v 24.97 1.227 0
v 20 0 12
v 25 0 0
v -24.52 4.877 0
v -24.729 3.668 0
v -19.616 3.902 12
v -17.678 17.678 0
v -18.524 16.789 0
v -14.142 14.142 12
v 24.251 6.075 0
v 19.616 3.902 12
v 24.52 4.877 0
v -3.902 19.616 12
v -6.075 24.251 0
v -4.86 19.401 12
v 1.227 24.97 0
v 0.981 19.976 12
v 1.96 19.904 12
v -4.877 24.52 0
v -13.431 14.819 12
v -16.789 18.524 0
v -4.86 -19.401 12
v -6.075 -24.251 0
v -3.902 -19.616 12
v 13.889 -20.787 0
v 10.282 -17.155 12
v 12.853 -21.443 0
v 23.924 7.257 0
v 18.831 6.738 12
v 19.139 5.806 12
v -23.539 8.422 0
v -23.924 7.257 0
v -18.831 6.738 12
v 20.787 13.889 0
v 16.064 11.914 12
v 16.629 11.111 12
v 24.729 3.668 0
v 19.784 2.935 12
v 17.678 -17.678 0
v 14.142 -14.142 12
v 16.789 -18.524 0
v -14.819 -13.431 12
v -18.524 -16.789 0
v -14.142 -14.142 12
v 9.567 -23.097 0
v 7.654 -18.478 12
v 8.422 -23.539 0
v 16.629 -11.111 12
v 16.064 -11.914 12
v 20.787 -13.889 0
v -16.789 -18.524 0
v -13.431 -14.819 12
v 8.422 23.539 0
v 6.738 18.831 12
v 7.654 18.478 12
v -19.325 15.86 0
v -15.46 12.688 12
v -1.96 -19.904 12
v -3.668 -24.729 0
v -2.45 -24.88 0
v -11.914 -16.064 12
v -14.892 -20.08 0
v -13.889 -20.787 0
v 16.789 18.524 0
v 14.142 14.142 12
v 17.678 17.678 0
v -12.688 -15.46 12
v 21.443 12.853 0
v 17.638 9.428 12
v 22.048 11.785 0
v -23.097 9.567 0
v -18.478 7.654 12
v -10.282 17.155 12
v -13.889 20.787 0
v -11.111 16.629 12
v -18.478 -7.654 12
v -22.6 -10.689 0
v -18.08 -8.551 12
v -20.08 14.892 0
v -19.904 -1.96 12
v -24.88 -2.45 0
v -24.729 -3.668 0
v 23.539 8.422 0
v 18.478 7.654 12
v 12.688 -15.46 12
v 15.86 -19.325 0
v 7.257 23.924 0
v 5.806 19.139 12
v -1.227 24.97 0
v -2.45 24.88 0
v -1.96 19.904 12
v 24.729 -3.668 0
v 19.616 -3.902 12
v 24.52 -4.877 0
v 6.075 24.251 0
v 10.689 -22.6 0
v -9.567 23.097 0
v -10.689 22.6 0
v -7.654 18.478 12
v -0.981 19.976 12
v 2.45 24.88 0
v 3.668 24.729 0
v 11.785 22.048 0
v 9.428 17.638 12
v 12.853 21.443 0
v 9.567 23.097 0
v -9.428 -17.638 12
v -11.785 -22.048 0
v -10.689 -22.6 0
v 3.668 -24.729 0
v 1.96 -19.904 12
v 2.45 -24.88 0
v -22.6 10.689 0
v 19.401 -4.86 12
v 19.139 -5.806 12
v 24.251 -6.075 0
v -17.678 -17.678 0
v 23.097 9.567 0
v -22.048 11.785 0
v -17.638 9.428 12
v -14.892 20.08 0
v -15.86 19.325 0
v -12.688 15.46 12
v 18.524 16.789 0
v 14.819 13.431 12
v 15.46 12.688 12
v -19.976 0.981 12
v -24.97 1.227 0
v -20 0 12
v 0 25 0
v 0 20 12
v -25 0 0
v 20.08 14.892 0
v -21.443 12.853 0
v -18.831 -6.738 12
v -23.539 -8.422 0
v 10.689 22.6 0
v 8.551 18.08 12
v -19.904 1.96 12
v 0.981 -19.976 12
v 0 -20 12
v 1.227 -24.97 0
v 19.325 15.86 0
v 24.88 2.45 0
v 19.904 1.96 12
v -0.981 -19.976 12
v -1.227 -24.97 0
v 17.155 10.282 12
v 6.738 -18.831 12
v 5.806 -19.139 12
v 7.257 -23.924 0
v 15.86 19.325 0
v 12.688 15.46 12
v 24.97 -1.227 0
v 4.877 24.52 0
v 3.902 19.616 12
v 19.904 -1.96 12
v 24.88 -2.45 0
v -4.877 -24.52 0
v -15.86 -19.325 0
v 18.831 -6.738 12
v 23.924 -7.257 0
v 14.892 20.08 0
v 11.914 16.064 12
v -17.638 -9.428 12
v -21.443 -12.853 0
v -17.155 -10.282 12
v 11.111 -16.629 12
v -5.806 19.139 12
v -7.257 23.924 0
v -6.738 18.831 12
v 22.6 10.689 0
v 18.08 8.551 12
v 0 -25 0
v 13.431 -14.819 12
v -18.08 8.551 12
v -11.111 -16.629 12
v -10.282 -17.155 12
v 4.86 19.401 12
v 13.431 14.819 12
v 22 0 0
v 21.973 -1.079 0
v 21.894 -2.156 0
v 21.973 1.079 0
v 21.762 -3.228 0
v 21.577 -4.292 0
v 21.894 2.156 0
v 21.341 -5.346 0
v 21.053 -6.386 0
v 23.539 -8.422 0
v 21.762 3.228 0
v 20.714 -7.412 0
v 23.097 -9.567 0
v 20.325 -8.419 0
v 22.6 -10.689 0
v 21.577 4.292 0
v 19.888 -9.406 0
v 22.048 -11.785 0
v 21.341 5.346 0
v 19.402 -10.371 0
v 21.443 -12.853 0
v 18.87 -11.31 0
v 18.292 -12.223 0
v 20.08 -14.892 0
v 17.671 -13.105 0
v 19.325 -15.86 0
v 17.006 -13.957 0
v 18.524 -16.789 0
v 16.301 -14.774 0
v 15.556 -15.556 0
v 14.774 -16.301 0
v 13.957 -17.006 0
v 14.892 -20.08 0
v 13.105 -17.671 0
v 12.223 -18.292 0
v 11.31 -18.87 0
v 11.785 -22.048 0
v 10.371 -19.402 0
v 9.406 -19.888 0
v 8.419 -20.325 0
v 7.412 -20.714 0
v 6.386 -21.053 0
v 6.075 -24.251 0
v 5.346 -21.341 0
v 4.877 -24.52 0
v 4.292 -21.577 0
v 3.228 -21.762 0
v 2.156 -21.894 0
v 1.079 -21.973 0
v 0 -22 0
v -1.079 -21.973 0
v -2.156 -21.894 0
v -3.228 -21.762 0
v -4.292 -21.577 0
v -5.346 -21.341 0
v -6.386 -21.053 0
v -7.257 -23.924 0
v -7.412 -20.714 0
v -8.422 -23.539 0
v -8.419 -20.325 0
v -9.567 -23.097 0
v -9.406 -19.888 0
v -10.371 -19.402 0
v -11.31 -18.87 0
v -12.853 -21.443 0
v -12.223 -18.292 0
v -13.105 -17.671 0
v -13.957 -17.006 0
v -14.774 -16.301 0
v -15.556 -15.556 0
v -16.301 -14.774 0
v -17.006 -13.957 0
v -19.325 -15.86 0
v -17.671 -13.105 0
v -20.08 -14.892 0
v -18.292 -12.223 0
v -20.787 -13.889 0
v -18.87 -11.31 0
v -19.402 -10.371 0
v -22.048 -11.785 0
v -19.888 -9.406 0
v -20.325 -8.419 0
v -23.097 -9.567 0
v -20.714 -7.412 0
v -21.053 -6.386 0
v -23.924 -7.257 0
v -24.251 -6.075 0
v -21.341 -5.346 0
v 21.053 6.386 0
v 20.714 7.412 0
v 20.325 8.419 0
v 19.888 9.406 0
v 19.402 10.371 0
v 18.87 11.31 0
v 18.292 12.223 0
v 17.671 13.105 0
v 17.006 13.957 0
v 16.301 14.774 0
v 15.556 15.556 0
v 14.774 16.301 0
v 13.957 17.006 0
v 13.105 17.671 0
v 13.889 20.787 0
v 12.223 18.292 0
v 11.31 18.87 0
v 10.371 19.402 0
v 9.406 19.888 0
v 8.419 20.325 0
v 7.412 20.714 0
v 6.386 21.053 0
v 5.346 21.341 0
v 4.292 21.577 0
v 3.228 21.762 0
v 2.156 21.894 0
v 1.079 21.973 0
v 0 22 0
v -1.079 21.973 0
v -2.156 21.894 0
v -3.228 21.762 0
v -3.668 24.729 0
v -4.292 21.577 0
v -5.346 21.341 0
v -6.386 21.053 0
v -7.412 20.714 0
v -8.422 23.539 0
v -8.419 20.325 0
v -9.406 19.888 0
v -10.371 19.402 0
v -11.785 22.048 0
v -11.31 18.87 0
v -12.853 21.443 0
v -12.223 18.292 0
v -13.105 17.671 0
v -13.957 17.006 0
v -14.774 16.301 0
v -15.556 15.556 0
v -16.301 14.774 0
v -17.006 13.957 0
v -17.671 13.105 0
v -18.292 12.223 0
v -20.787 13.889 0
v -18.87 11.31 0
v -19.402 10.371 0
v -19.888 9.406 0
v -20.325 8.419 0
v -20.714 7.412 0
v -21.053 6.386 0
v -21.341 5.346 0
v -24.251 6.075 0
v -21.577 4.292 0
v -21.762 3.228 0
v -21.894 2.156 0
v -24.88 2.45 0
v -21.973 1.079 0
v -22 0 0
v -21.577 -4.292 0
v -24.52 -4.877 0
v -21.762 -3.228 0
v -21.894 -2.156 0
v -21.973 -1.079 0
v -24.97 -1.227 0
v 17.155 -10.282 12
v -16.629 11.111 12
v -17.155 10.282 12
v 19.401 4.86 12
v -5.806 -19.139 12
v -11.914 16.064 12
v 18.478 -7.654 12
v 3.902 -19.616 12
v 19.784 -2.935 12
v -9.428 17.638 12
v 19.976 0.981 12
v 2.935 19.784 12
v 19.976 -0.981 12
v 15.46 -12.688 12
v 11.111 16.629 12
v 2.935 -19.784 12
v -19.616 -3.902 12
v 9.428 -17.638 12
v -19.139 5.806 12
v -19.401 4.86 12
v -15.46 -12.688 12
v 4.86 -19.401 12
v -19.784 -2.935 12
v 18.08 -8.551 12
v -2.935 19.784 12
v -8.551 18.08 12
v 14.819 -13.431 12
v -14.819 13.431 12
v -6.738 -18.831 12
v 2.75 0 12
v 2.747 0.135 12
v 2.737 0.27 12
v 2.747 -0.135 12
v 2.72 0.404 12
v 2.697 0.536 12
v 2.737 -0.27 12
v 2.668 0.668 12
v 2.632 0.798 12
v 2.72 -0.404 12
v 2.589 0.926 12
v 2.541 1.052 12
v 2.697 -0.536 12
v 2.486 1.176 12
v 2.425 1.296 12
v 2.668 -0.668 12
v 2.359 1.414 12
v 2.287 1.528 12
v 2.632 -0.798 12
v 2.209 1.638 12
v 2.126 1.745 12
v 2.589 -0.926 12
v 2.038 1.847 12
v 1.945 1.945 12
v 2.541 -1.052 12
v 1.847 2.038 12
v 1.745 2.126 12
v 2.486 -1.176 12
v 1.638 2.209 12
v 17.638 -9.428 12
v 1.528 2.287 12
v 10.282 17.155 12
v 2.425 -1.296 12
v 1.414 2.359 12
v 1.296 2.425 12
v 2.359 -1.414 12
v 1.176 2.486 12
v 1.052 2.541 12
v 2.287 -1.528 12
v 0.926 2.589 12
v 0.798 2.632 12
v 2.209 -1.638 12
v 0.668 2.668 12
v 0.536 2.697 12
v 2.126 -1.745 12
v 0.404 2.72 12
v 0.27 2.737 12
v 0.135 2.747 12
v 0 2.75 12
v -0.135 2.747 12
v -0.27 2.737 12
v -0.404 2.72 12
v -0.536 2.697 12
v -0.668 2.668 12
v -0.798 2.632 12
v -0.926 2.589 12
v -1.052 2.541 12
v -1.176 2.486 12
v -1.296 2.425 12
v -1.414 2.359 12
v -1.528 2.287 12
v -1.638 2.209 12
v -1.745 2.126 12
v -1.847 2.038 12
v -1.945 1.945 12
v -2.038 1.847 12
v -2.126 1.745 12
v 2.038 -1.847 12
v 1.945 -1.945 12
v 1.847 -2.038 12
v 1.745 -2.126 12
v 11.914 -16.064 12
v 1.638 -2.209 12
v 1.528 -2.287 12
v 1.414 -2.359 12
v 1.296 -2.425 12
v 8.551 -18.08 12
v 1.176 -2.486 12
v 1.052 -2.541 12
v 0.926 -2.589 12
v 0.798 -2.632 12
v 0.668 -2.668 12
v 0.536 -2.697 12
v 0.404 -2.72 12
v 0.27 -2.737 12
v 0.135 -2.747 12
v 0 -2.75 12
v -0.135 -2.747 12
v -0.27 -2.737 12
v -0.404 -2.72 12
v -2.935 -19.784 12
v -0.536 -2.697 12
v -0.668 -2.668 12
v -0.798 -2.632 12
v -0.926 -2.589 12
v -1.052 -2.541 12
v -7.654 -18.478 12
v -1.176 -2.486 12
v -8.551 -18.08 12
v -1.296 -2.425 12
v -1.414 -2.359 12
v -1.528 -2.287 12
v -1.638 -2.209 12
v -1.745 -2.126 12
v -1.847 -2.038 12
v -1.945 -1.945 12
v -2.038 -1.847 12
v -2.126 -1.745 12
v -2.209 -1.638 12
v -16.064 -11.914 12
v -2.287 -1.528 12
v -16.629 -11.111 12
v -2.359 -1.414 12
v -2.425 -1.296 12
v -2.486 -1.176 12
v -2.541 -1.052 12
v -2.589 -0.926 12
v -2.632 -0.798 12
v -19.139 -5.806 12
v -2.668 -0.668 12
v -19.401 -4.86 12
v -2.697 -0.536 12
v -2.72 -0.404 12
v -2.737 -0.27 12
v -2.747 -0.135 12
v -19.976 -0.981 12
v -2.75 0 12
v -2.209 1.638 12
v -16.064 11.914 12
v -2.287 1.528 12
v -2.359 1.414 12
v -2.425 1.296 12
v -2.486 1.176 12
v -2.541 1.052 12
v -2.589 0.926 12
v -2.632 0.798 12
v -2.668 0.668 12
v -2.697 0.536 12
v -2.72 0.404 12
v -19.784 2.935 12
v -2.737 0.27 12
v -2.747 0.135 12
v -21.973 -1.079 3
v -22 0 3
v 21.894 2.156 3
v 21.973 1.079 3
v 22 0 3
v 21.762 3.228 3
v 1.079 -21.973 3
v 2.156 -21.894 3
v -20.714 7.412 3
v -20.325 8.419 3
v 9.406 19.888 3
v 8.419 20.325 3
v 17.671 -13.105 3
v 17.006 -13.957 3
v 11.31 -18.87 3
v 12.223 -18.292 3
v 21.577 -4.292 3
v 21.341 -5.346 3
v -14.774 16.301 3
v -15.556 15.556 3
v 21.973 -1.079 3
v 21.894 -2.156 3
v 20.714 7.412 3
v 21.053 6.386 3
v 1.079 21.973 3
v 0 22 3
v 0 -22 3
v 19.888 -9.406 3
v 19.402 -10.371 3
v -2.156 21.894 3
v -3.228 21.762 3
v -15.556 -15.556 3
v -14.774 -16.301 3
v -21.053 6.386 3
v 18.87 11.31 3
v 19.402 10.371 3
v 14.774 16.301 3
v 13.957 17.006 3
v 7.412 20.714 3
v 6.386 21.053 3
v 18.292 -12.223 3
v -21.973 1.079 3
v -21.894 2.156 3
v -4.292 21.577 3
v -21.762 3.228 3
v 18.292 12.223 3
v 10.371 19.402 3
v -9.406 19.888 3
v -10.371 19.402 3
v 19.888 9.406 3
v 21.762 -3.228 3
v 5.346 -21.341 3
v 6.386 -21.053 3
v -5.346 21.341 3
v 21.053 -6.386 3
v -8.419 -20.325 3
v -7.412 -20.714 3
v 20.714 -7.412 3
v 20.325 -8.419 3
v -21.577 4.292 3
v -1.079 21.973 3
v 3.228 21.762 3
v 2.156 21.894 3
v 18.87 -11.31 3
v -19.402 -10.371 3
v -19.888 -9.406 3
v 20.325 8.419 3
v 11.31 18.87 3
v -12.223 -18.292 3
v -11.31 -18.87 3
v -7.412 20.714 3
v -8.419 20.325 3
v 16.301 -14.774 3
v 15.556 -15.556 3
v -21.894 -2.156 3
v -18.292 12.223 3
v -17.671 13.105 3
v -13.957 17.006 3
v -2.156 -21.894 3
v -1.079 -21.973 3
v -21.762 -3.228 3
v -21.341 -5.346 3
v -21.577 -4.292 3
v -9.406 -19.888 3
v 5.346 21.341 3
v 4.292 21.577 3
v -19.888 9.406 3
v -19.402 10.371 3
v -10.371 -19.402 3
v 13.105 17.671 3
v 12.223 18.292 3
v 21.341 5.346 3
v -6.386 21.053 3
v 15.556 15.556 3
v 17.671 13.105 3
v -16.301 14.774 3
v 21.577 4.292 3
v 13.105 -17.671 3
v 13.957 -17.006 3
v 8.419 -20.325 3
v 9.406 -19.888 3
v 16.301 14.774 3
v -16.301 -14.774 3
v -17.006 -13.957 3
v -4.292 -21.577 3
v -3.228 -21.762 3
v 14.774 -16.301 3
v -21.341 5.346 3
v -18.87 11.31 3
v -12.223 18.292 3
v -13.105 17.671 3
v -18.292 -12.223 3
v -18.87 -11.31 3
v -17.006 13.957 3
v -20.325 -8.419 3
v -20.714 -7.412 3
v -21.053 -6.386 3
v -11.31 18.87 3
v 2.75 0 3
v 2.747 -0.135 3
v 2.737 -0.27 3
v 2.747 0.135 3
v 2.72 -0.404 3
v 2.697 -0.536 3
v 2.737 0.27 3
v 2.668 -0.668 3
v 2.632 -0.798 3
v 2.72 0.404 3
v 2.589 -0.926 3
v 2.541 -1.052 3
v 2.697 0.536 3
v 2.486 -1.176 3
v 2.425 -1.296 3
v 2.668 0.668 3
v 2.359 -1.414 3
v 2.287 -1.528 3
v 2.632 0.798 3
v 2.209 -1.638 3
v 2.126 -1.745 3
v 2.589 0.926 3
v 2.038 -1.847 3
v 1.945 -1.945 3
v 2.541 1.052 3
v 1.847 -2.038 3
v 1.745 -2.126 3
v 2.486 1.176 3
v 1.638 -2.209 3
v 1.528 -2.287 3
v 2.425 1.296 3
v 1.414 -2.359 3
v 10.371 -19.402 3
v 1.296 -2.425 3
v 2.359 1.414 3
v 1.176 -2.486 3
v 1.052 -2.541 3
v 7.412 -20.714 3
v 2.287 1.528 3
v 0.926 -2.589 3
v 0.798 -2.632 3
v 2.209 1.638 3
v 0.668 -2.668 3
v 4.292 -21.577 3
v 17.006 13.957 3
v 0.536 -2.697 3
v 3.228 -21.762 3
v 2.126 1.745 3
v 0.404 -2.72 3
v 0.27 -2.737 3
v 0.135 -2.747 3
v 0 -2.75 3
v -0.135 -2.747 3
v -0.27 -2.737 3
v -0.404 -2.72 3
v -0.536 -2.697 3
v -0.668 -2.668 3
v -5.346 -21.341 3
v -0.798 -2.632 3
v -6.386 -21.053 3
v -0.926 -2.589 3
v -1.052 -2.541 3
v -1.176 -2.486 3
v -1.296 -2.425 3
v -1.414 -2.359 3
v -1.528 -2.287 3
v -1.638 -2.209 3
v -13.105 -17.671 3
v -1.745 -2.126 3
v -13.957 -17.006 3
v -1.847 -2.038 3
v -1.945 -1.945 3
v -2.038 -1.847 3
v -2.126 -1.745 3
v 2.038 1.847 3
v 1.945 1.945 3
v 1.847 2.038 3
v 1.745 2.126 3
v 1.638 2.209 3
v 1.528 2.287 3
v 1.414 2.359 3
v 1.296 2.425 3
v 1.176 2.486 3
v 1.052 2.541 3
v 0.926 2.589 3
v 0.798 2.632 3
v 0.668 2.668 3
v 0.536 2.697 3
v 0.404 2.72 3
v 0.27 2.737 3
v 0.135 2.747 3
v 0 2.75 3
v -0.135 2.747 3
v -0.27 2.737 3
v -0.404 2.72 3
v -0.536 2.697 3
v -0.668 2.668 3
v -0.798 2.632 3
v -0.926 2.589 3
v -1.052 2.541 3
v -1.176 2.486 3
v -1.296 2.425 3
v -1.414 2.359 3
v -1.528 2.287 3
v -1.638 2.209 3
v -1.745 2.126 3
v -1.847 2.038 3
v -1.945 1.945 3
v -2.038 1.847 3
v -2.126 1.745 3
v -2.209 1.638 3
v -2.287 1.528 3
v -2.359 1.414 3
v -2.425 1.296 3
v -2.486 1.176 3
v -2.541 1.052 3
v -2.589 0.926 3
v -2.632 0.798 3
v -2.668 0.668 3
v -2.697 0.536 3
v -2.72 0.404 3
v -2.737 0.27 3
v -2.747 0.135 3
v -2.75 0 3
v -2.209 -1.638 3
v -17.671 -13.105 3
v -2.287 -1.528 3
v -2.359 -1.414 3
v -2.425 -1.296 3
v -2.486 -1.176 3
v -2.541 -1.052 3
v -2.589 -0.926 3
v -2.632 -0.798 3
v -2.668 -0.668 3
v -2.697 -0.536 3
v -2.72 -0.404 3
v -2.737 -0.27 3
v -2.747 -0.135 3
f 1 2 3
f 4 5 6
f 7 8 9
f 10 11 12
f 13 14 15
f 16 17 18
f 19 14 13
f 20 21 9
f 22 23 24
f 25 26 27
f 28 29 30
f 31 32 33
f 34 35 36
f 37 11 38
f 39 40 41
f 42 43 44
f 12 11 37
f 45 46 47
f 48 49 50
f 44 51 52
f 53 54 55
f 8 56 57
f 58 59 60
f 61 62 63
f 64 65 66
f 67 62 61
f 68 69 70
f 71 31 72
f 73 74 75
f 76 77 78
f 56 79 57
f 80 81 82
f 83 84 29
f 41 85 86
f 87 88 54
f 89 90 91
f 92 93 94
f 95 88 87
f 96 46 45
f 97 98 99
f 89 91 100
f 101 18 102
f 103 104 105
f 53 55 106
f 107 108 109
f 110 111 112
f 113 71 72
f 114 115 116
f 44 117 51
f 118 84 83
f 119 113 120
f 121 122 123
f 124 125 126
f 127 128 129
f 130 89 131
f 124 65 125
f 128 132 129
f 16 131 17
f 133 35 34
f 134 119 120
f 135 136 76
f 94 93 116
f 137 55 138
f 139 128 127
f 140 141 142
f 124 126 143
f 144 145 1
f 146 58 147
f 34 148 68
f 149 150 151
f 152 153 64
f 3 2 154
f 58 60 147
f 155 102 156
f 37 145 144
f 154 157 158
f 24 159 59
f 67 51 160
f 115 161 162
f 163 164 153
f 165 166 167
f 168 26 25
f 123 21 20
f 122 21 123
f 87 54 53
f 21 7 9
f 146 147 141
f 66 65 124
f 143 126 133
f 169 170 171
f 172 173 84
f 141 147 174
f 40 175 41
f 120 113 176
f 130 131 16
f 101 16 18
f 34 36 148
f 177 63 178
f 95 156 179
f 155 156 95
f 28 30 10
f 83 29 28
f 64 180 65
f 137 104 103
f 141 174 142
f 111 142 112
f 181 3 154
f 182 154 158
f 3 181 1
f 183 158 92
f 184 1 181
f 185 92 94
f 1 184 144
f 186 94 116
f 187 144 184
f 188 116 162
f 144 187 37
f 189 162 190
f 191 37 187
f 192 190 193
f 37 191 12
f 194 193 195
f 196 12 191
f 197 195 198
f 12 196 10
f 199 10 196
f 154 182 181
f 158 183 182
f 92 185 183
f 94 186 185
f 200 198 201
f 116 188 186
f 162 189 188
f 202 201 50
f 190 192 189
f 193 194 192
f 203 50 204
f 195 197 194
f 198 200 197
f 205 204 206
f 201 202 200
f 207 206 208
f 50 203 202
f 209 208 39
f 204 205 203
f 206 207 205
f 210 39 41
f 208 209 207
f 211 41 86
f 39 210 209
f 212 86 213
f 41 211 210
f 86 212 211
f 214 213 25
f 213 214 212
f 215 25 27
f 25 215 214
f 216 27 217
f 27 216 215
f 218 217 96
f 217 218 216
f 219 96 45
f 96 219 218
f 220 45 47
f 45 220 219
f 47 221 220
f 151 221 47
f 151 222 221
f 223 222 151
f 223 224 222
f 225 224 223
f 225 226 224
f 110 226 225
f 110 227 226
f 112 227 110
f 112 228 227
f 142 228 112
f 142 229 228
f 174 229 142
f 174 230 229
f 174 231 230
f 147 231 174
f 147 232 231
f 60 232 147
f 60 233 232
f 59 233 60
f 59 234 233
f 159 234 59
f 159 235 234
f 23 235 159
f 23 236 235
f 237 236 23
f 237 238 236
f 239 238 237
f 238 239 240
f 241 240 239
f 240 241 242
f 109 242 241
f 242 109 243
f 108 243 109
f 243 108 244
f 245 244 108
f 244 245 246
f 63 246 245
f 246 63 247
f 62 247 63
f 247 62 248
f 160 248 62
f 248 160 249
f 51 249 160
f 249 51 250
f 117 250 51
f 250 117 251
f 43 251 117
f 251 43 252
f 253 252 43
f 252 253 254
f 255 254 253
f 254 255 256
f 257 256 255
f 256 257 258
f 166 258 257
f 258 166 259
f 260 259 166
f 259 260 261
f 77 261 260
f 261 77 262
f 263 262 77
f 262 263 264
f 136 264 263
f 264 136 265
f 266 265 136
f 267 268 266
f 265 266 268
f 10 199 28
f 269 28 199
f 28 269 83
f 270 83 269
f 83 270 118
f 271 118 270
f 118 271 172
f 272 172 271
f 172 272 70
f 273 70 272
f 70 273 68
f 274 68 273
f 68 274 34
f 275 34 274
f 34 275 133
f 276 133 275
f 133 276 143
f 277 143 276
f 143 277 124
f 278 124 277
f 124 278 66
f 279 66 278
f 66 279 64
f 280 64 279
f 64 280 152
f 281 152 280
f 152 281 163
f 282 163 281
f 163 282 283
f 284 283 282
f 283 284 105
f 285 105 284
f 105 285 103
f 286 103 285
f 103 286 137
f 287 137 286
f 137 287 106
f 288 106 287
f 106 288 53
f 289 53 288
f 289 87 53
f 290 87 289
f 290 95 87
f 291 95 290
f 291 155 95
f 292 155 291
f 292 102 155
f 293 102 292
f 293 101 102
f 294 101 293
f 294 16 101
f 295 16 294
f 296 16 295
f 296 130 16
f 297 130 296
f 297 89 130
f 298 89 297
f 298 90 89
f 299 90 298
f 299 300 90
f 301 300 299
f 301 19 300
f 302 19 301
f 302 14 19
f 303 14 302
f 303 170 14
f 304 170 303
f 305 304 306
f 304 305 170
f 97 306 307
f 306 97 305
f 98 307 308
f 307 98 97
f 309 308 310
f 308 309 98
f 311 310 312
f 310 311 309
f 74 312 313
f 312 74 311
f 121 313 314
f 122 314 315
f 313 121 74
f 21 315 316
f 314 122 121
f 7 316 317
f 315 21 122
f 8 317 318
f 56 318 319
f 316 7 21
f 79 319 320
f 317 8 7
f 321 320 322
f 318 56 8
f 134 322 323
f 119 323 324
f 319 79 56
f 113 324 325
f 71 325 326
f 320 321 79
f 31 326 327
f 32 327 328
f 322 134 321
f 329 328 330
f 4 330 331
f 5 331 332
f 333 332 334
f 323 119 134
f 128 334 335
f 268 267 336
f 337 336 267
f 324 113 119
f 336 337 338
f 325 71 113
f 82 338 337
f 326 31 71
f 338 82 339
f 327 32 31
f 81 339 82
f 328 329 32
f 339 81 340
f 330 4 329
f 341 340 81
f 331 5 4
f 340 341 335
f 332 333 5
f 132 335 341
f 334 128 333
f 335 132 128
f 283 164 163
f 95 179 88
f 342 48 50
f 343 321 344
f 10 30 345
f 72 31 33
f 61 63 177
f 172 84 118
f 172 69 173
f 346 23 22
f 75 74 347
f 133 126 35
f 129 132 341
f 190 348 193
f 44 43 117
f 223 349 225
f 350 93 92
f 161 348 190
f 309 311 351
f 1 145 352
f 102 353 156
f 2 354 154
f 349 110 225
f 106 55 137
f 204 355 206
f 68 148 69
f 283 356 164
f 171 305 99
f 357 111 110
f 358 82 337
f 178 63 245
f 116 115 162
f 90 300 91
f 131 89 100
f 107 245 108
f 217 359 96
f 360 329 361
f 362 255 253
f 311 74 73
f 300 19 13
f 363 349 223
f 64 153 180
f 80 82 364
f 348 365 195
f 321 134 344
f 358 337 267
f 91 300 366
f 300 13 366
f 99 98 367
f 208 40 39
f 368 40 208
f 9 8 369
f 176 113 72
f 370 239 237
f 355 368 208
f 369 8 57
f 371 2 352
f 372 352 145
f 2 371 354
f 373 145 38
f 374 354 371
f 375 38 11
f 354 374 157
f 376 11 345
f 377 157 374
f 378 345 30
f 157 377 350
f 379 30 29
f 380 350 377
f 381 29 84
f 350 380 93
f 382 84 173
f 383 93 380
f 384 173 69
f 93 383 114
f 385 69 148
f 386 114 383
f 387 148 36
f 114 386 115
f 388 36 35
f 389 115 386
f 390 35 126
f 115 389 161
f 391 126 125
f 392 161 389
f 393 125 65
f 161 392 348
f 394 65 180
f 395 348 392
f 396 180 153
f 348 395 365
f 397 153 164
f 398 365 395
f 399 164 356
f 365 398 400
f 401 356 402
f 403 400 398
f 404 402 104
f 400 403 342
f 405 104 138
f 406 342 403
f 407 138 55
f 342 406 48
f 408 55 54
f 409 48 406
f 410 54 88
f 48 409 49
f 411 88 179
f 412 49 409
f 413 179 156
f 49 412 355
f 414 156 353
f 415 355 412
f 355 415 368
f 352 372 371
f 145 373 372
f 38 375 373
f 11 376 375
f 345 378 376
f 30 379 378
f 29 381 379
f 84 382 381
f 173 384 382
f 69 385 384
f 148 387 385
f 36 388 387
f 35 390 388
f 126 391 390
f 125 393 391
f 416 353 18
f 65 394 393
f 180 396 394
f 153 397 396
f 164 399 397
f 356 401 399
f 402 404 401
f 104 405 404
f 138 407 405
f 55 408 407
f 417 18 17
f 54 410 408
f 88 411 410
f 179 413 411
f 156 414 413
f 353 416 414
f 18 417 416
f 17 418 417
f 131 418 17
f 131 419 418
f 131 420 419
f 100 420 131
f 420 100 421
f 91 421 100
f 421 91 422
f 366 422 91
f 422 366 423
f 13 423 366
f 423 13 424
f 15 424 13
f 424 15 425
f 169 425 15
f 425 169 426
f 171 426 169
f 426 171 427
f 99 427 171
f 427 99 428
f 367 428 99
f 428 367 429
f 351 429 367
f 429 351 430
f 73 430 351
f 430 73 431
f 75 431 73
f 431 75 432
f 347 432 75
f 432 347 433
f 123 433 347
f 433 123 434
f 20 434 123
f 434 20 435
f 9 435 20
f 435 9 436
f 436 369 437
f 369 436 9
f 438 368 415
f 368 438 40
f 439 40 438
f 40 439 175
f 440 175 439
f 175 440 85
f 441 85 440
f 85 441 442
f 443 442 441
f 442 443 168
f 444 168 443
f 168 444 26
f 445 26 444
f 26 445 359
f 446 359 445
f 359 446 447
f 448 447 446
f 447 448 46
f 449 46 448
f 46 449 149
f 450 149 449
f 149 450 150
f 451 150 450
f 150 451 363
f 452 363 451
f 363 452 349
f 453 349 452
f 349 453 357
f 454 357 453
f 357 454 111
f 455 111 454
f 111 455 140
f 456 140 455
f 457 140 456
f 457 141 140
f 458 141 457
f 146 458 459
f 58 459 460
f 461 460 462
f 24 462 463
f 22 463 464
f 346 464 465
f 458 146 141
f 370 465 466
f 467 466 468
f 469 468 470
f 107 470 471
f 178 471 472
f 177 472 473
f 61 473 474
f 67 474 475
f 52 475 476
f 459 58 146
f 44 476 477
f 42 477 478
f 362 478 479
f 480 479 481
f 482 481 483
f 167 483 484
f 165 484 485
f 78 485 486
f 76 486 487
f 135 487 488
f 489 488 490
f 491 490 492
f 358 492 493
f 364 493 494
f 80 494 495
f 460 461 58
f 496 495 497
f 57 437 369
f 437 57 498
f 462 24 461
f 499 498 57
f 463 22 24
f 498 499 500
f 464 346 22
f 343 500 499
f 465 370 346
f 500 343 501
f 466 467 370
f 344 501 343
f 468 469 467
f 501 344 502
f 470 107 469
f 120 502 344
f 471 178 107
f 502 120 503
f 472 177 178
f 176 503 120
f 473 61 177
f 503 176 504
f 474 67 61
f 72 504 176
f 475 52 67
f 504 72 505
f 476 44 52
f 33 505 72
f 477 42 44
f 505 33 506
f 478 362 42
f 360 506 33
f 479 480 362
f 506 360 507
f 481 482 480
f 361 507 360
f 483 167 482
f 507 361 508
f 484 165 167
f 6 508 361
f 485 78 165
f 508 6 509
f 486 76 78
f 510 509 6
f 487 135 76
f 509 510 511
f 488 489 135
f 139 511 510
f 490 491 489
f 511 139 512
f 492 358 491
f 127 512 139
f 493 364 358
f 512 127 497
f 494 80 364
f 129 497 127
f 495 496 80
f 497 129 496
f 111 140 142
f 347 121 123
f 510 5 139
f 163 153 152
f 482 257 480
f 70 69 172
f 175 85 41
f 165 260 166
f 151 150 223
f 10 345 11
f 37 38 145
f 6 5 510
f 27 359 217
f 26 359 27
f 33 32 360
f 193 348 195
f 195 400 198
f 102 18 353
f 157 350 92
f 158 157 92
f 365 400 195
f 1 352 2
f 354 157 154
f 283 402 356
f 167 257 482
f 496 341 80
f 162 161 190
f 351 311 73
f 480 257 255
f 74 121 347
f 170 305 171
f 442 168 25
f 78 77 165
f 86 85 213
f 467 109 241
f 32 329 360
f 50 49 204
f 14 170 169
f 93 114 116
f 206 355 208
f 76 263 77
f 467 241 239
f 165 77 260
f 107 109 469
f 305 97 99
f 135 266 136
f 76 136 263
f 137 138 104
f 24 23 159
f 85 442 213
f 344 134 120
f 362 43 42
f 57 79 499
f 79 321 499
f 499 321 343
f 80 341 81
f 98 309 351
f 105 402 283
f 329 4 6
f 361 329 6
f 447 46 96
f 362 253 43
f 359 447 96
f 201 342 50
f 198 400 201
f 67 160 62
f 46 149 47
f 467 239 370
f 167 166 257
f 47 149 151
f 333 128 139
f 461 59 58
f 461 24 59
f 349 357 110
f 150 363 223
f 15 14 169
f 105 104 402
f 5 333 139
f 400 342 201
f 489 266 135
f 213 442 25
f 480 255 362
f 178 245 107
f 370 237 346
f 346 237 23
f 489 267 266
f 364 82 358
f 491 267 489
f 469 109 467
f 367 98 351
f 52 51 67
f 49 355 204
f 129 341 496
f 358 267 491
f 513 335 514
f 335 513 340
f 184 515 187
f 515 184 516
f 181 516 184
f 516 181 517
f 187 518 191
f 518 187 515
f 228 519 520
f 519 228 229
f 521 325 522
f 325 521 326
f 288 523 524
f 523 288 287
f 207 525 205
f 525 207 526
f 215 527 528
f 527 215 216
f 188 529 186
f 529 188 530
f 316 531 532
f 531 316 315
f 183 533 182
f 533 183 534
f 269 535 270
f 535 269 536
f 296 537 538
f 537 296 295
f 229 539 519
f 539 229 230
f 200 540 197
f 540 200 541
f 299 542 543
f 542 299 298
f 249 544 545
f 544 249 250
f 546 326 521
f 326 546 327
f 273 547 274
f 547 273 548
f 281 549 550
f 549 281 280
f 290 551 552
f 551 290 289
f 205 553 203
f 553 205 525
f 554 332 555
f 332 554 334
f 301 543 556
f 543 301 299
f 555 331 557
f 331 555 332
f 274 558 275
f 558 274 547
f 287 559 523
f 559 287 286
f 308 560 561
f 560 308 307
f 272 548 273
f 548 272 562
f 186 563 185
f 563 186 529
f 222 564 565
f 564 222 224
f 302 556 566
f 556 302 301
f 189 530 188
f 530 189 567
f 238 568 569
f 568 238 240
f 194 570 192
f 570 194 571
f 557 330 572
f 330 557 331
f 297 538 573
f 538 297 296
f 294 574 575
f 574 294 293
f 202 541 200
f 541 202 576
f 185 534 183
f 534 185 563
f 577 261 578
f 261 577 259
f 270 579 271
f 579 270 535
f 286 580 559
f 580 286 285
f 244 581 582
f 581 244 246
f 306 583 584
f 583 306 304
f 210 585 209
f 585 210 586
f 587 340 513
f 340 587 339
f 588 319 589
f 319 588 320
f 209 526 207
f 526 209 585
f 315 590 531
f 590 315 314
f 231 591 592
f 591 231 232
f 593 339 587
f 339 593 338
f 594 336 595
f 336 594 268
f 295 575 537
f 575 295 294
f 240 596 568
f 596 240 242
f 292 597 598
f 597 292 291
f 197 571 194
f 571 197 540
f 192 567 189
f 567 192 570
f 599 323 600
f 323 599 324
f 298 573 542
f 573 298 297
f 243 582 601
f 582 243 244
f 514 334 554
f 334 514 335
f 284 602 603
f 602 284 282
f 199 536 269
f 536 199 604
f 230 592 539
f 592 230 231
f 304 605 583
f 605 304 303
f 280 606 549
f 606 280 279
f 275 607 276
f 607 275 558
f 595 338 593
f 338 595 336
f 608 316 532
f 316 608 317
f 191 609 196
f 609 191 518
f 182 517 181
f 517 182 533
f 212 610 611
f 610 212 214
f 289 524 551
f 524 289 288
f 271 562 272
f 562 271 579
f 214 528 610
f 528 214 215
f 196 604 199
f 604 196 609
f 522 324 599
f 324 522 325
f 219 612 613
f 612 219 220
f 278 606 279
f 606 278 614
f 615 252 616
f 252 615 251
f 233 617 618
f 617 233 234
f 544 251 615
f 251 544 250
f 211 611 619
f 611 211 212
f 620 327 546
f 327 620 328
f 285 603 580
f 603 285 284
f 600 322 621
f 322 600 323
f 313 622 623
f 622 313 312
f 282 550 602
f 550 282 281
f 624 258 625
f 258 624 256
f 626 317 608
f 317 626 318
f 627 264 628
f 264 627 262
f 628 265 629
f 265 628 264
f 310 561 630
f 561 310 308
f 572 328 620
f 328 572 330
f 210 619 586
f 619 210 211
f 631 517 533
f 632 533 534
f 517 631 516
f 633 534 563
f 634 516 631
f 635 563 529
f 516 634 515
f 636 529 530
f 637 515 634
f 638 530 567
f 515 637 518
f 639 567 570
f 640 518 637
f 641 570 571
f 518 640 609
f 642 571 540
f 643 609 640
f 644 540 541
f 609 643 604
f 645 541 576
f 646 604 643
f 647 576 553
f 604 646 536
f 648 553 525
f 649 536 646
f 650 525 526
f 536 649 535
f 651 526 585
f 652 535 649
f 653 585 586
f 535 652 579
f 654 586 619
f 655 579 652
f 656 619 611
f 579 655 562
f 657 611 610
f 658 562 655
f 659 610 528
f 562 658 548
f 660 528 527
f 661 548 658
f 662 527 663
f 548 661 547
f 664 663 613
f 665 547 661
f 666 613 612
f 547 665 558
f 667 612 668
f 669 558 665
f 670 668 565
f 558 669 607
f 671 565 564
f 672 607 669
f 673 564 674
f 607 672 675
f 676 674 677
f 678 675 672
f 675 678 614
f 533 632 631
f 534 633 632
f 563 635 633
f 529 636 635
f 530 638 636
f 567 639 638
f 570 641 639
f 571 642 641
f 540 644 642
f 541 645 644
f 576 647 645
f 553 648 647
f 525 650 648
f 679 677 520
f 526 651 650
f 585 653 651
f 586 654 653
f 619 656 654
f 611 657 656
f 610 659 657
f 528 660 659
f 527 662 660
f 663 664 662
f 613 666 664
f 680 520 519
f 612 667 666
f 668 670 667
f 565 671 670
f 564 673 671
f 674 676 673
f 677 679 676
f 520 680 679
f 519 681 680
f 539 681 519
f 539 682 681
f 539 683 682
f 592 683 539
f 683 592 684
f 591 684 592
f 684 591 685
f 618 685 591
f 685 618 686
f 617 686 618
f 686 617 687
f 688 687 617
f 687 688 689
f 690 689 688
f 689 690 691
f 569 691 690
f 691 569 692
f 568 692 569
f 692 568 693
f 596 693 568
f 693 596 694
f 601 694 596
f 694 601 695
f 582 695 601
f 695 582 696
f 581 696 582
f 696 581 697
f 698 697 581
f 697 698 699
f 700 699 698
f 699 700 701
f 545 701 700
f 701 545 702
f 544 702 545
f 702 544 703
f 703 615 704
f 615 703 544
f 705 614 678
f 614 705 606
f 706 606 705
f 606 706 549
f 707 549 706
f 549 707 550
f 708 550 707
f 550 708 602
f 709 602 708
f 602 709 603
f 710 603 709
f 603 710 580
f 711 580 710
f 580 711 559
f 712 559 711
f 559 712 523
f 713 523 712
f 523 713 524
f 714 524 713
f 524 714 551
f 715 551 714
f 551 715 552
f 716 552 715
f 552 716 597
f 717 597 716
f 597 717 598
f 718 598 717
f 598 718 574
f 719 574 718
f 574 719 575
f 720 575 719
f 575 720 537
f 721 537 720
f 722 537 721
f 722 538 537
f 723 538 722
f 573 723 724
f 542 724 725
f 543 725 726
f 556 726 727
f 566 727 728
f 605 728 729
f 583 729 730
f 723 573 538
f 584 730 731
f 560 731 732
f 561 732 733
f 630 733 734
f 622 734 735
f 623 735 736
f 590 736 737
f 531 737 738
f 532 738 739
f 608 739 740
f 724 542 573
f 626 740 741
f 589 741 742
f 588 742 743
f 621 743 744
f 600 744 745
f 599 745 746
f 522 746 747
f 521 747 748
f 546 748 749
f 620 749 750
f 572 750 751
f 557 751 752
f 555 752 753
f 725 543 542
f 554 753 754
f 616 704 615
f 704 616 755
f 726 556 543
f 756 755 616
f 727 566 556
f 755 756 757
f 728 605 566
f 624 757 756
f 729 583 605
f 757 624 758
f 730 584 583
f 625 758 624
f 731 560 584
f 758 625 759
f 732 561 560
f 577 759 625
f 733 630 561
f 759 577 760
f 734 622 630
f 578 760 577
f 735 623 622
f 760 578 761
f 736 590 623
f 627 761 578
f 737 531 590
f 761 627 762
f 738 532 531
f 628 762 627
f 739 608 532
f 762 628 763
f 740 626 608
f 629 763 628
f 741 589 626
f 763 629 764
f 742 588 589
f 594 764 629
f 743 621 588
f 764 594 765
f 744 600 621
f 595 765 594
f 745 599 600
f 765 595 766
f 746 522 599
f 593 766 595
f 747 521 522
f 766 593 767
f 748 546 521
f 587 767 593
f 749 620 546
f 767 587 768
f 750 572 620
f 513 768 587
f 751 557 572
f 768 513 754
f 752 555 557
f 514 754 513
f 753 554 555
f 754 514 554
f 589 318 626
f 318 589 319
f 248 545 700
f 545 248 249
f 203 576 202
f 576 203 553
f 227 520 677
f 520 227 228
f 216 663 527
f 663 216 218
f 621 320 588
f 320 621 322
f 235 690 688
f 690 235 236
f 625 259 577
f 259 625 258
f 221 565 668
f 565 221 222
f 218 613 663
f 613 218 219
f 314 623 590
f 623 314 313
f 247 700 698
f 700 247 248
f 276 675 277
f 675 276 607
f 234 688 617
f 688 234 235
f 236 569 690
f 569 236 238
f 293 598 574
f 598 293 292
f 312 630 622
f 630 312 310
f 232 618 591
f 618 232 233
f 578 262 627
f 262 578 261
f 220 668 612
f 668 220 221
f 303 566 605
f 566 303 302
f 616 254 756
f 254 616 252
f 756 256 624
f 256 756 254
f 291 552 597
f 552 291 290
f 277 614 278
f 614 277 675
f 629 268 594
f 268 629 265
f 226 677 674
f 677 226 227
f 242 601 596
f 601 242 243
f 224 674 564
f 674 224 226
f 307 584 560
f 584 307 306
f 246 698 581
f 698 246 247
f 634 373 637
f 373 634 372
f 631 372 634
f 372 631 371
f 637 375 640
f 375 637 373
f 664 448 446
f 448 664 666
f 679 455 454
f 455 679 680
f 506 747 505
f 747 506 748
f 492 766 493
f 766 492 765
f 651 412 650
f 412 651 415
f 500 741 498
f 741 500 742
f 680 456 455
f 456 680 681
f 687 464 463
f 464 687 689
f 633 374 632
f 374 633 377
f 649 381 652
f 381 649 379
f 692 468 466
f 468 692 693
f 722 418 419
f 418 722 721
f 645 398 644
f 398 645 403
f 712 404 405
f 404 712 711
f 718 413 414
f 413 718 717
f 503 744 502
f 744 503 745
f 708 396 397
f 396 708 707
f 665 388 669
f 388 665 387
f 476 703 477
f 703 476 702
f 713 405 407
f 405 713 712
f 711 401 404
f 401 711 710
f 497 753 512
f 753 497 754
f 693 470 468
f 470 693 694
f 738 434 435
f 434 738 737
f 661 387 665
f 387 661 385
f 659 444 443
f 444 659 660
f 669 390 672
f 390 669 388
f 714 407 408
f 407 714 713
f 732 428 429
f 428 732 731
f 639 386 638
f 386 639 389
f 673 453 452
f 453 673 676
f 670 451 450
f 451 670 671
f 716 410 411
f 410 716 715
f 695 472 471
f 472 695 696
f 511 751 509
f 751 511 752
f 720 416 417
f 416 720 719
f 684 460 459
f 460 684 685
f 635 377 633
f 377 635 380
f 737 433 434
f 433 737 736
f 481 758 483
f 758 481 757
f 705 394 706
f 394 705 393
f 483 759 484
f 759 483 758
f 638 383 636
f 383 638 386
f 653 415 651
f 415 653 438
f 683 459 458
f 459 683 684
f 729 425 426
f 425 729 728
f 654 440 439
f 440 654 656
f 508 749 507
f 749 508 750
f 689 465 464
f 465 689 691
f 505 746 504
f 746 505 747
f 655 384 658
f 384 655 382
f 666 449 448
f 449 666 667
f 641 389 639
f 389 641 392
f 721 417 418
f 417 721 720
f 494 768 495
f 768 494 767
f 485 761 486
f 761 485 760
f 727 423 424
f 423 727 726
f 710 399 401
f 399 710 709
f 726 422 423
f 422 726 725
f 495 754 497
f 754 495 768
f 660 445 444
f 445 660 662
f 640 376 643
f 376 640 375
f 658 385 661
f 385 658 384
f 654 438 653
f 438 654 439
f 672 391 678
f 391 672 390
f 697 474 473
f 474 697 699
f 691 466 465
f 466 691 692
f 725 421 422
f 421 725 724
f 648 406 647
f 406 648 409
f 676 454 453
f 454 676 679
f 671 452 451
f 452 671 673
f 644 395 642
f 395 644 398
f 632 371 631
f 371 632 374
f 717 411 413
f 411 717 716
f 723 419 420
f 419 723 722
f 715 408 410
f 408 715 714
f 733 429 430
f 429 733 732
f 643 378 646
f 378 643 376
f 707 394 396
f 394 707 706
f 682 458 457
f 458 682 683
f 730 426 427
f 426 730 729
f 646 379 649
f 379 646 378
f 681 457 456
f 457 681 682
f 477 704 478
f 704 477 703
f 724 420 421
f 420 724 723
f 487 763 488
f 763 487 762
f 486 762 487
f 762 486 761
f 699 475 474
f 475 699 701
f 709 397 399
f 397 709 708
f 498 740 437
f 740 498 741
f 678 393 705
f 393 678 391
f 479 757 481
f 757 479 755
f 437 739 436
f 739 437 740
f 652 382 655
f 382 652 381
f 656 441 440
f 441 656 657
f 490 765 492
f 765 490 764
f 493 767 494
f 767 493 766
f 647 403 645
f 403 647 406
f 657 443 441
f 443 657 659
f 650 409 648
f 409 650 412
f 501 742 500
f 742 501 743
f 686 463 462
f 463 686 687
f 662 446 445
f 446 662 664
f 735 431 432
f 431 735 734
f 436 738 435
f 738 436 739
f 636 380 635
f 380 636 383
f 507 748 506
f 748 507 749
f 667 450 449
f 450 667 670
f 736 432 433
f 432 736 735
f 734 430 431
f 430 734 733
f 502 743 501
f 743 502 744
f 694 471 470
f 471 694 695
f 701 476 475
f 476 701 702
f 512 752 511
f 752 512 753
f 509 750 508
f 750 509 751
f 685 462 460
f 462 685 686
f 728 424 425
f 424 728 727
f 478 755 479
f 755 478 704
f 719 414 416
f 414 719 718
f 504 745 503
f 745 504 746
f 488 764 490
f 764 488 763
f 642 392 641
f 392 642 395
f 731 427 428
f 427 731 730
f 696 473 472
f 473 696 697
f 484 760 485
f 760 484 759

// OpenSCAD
// Anti-vibration foot for benchtop instrument
// Print orientation: wide base on bed (z = 0), narrow top at z = 12

// ---------------- Parameters ----------------
base_d      = 50;    // frustum diameter at bottom (z = 0)
top_d       = 40;    // frustum diameter at flat top
foot_h      = 12;    // overall height of foot

recess_d    = 44;    // rubber pad recess diameter (bottom face)
recess_h    = 3;     // rubber pad recess depth

screw_d     = 5.5;   // through-hole diameter for screw

eps         = 0.5;   // overshoot for clean boolean cuts
$fn         = 128;   // curve resolution

// ---------------- Model ----------------
difference() {
    // Main frustum body
    cylinder(h = foot_h, d1 = base_d, d2 = top_d);

    // Rubber pad recess in bottom face
    translate([0, 0, -eps])
        cylinder(h = recess_h + eps, d = recess_d);

    // Central screw hole, full height
    translate([0, 0, -eps])
        cylinder(h = foot_h + 2 * eps, d = screw_d);
}
